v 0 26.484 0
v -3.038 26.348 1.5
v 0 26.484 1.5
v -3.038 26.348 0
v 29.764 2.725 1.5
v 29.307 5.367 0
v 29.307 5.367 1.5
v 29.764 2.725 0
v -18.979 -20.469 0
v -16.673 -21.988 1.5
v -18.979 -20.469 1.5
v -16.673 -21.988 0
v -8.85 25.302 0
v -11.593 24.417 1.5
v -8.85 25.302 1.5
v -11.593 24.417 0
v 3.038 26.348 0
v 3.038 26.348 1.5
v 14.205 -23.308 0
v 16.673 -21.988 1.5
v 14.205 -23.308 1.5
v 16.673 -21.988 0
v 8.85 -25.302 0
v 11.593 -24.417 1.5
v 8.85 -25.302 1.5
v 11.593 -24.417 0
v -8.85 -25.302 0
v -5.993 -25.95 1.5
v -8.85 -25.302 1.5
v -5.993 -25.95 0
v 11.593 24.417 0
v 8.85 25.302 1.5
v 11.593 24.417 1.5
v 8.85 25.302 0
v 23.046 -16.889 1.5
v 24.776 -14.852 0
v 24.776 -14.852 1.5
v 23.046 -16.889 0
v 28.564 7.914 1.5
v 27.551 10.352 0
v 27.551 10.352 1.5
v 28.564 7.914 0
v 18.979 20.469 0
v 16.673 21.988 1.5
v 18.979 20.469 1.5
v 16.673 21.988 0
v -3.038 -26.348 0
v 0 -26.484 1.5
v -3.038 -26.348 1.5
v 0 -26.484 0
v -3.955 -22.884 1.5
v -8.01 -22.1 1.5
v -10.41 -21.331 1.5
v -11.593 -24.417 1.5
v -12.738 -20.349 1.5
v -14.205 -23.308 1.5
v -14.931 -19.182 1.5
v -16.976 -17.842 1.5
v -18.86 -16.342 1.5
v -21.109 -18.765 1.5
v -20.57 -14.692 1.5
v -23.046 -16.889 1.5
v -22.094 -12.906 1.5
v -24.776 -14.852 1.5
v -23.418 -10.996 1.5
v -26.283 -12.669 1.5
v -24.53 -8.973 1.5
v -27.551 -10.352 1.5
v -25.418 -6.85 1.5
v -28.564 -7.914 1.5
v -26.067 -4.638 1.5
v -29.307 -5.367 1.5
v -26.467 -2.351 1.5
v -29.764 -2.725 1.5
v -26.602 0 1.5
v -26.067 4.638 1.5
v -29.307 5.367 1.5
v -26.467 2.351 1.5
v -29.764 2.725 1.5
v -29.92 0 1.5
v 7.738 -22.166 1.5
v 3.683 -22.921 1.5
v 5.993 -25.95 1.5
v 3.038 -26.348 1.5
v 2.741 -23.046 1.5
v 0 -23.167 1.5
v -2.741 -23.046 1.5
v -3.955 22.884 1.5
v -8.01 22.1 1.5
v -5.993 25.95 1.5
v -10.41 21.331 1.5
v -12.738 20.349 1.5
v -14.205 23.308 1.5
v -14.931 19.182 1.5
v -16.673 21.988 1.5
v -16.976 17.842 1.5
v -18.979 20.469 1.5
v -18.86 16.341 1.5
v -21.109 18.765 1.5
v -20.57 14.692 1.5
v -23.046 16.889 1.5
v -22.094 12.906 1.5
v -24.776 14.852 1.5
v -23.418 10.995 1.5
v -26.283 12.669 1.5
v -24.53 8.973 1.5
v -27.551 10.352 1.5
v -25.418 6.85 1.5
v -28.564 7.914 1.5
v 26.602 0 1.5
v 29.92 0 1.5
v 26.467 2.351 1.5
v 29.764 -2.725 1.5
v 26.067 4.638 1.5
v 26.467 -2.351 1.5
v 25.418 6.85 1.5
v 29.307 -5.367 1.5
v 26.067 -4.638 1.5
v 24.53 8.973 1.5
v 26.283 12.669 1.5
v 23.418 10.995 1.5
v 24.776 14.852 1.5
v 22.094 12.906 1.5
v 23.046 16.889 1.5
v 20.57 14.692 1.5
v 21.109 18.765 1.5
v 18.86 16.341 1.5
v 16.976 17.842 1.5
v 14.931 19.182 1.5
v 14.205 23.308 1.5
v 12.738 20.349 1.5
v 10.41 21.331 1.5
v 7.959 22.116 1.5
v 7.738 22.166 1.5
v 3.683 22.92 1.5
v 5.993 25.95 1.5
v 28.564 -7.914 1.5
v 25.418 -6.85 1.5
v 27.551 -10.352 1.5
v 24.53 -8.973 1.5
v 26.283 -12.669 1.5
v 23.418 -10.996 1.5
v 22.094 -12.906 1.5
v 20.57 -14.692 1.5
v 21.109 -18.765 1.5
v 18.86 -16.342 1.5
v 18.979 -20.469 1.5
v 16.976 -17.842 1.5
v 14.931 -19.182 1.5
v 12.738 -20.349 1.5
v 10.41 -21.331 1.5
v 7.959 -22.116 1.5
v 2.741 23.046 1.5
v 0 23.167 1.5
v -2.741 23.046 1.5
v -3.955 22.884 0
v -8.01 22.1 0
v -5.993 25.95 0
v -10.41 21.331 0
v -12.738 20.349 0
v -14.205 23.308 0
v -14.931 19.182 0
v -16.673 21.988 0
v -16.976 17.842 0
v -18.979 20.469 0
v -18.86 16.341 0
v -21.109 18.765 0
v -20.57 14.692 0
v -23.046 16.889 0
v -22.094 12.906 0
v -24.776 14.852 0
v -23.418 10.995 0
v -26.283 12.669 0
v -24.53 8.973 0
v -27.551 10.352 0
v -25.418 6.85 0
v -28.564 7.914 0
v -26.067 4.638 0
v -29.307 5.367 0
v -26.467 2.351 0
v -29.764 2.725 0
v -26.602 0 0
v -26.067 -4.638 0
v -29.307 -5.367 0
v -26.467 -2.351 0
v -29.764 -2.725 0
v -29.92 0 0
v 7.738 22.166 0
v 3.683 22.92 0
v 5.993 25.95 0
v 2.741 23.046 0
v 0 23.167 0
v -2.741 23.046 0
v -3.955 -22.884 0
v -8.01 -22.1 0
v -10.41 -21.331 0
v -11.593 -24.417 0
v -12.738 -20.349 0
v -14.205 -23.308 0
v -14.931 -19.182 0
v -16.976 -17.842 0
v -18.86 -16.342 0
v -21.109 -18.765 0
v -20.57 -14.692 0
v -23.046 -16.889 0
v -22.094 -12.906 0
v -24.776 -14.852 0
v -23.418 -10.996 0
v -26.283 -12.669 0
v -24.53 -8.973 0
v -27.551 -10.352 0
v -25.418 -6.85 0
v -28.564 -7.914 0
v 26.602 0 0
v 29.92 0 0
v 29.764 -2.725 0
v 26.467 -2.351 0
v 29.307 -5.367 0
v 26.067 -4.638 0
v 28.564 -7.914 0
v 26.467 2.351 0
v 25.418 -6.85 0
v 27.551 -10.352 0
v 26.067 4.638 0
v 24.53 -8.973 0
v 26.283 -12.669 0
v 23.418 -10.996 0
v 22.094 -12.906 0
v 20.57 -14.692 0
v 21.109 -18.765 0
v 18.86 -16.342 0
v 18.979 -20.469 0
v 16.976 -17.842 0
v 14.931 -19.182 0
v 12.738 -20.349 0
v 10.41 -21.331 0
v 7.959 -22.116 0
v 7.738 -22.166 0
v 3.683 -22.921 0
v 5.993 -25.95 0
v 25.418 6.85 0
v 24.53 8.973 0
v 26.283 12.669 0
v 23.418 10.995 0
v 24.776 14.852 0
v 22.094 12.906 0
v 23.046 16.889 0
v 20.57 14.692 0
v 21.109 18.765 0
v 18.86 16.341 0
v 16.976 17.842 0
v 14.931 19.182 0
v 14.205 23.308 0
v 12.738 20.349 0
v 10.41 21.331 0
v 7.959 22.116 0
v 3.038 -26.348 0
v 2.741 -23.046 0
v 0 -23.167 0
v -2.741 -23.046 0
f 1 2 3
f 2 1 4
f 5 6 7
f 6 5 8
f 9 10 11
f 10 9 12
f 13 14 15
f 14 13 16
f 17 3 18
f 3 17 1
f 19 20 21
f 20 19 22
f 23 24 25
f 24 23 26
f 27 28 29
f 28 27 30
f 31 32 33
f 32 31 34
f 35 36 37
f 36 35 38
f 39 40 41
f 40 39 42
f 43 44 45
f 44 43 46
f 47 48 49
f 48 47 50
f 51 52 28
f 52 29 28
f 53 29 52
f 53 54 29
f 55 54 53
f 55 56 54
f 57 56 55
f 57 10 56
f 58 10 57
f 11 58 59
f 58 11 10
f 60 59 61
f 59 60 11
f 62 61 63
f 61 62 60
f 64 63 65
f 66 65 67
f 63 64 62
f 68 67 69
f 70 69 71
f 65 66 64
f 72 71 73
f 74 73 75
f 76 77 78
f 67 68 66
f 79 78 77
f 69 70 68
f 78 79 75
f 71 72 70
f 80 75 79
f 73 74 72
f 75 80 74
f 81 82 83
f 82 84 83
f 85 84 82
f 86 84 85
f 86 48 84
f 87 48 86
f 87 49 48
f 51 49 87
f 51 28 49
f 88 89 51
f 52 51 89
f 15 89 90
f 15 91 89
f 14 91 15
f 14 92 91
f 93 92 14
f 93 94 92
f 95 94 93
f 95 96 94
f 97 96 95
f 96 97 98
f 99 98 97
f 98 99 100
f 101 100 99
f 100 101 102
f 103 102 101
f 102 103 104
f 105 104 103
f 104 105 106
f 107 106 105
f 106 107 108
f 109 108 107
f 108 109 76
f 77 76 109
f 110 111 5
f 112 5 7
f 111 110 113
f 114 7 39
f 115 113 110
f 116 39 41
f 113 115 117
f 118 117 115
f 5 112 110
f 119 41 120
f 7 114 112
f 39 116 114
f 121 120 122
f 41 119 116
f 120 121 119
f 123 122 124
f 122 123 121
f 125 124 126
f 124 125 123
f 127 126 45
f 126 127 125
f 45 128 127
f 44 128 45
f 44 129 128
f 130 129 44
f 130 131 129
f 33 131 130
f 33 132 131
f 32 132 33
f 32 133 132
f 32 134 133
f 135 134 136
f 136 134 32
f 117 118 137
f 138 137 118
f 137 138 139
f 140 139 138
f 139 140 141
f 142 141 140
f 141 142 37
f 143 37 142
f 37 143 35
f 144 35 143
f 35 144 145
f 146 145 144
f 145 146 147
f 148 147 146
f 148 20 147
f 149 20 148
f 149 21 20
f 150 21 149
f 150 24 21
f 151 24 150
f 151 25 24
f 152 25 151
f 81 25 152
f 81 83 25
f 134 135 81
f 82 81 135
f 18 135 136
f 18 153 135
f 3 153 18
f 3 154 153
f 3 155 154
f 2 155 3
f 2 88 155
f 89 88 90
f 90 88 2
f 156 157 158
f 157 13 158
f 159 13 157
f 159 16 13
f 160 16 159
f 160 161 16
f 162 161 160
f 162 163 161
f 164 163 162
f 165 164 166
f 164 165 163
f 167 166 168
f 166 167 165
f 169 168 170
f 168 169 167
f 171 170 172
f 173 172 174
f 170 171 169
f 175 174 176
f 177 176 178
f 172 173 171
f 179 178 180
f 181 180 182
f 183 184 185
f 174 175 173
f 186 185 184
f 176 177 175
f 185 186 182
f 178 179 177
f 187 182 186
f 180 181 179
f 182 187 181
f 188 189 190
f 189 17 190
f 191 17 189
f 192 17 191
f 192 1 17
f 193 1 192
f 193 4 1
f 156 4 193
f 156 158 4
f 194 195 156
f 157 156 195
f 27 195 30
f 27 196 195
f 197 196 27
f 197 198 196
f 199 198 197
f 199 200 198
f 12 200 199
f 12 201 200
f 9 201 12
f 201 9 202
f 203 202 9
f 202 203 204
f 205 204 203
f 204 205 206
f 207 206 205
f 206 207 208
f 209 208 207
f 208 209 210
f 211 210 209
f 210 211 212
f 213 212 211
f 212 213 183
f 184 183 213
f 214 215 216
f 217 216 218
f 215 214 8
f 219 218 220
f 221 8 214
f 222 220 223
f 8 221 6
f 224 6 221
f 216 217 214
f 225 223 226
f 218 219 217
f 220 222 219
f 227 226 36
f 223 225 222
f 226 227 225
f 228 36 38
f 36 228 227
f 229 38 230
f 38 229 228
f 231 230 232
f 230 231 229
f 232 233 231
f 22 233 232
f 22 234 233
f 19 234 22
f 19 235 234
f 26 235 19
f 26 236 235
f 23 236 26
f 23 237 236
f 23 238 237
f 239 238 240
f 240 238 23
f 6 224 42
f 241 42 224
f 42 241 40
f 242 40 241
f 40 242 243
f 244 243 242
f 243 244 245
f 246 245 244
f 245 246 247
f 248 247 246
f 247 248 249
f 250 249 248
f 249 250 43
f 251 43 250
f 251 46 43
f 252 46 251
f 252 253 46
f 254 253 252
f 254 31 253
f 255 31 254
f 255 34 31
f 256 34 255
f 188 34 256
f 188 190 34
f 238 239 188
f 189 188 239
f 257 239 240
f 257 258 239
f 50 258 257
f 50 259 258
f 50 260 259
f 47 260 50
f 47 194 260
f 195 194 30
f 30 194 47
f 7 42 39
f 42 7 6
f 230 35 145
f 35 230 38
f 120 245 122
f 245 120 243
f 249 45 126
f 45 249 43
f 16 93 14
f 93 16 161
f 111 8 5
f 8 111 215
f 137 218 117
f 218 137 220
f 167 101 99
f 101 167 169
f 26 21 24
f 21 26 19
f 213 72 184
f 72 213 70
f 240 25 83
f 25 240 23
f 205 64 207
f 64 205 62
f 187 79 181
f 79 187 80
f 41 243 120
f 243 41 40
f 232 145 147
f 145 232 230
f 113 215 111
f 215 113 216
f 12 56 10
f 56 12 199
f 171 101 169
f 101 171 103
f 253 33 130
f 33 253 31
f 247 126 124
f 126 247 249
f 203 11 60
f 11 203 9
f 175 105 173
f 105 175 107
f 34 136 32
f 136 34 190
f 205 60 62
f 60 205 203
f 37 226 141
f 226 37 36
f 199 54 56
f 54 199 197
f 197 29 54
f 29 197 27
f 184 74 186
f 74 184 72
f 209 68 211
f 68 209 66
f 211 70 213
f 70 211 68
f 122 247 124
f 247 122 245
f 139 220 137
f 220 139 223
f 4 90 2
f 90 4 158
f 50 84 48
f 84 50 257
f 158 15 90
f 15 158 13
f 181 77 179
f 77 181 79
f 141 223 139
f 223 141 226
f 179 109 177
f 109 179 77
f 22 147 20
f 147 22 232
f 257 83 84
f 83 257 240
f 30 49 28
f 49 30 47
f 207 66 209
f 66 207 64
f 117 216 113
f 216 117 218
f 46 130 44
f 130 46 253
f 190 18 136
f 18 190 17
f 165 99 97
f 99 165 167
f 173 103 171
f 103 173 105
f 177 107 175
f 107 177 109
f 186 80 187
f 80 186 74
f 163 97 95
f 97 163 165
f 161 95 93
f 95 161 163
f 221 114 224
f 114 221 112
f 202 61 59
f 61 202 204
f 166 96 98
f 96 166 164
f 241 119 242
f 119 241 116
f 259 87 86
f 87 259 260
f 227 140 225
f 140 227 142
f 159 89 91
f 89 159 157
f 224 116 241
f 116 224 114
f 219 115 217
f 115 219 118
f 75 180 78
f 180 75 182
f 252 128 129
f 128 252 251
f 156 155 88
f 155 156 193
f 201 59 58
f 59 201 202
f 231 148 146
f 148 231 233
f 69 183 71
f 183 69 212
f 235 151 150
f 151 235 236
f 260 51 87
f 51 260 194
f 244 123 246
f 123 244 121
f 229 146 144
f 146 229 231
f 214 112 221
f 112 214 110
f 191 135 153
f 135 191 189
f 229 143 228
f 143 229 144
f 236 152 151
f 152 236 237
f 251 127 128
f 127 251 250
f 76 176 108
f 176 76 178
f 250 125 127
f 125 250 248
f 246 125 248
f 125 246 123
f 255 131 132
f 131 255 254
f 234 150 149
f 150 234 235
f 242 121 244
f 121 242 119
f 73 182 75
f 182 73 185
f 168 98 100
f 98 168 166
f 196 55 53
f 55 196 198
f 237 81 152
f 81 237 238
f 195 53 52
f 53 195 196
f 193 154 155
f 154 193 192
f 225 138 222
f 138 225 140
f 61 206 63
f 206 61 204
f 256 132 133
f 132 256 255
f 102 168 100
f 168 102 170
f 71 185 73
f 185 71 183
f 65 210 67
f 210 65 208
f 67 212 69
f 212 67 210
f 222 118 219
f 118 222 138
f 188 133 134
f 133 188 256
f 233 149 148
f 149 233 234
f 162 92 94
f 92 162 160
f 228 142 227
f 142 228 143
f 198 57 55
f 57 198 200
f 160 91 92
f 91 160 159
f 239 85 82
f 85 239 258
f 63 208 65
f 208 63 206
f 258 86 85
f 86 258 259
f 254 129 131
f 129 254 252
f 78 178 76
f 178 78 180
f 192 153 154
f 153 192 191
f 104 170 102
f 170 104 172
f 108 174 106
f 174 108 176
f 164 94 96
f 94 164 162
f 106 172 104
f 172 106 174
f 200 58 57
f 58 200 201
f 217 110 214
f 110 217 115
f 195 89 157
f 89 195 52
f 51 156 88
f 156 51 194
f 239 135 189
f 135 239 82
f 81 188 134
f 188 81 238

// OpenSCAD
// Module names are of the form poly_<inkscape-path-id>().  As a result,
// you can associate a polygon in this OpenSCAD program with the corresponding
// SVG element in the Inkscape document by looking for the XML element with
// the attribute id="inkscape-path-id".

// fudge value is used to ensure that subtracted solids are a tad taller
// in the z dimension than the polygon being subtracted from.  This helps
// keep the resulting .stl file manifold.
fudge = 0.1;

module poly_path4325(h)
{
  scale([25.4/90, -25.4/90, 1]) union()
  {
    difference()
    {
       linear_extrude(height=h)
         polygon([[-0.000000,-93.840266],[-10.765294,-93.359776],[-21.236569,-91.948685],[-31.358562,-89.652565],[-41.076009,-86.516986],[-50.333645,-82.587519],[-59.076206,-77.909735],[-67.248428,-72.529204],[-74.795047,-66.491497],[-81.660798,-59.842185],[-87.790417,-52.626839],[-93.128640,-44.891029],[-97.620203,-36.680326],[-101.209842,-28.040301],[-103.842292,-19.016525],[-105.462289,-9.654568],[-106.014569,-0.000001],[-105.462289,9.654567],[-103.842292,19.016524],[-101.209842,28.040301],[-97.620203,36.680326],[-93.128640,44.891029],[-87.790417,52.626839],[-81.660798,59.842185],[-74.795047,66.491497],[-67.248428,72.529204],[-59.076206,77.909735],[-50.333645,82.587519],[-41.076009,86.516986],[-31.358562,89.652565],[-21.236569,91.948685],[-10.765294,93.359776],[-0.000000,93.840266],[10.765294,93.359776],[21.236569,91.948685],[31.358562,89.652565],[41.076008,86.516986],[50.333644,82.587519],[59.076204,77.909735],[67.248426,72.529204],[74.795044,66.491497],[81.660795,59.842185],[87.790414,52.626839],[93.128637,44.891029],[97.620200,36.680326],[101.209839,28.040301],[103.842290,19.016524],[105.462288,9.654567],[106.014569,-0.000001],[105.462289,-9.654568],[103.842292,-19.016525],[101.209842,-28.040301],[97.620203,-36.680326],[93.128640,-44.891029],[87.790417,-52.626839],[81.660798,-59.842185],[74.795047,-66.491497],[67.248428,-72.529204],[59.076206,-77.909735],[50.333645,-82.587519],[41.076009,-86.516986],[31.358562,-89.652565],[21.236569,-91.948685],[10.765294,-93.359776],[-0.000000,-93.840266]]);
       translate([0, 0, -fudge])
         linear_extrude(height=h+2*fudge)
           polygon([[-0.000000,-82.086334],[9.713790,-81.658393],[19.129542,-80.403182],[28.201906,-78.363616],[36.885534,-75.582612],[45.135076,-72.103087],[52.905185,-67.967957],[60.150511,-63.220138],[66.825704,-57.902547],[72.885417,-52.058101],[78.284300,-45.729715],[82.977004,-38.960307],[86.918181,-31.792793],[90.062482,-24.270088],[92.364557,-16.435111],[93.779058,-8.330776],[94.260636,-0.000001],[93.779057,8.330790],[92.364554,16.435166],[90.062476,24.270207],[86.918171,31.792993],[82.976990,38.960603],[78.284281,45.730118],[72.885394,52.058618],[66.825677,57.903182],[60.150481,63.220890],[52.905154,67.968822],[45.135045,72.104059],[36.885504,75.583679],[28.201879,78.364763],[19.129521,80.404391],[9.713778,81.659643],[-0.000000,82.087598],[-9.713778,81.659643],[-19.129521,80.404391],[-28.201879,78.364763],[-36.885504,75.583679],[-45.135045,72.104059],[-52.905154,67.968822],[-60.150481,63.220890],[-66.825677,57.903182],[-72.885394,52.058618],[-78.284281,45.730118],[-82.976990,38.960603],[-86.918171,31.792993],[-90.062476,24.270207],[-92.364554,16.435166],[-93.779057,8.330790],[-94.260636,-0.000001],[-93.779058,-8.330776],[-92.364557,-16.435111],[-90.062482,-24.270088],[-86.918181,-31.792793],[-82.977004,-38.960307],[-78.284300,-45.729715],[-72.885417,-52.058101],[-66.825704,-57.902547],[-60.150511,-63.220138],[-52.905185,-67.967957],[-45.135076,-72.103087],[-36.885534,-75.582612],[-28.201906,-78.363616],[-19.129542,-80.403182],[-9.713790,-81.658393],[-0.000000,-82.086334]]);
    }
  }
}

module poly_rect4144(h)
{
  scale([25.4/90, -25.4/90, 1]) union()
  {
    linear_extrude(height=h)
      polygon([[-28.382839,-84.994816],[-14.014569,-84.994816],[-14.014569,85.005184],[-28.382839,85.005184]]);
  }
}

module poly_rect41443(h)
{
  scale([25.4/90, -25.4/90, 1]) union()
  {
    linear_extrude(height=h)
      polygon([[13.050232,-85.994815],[27.418502,-85.994815],[27.418502,84.005185],[13.050232,84.005185]]);
  }
}

poly_path4325(1.5);
poly_rect4144(1.5);
poly_rect41443(1.5);
